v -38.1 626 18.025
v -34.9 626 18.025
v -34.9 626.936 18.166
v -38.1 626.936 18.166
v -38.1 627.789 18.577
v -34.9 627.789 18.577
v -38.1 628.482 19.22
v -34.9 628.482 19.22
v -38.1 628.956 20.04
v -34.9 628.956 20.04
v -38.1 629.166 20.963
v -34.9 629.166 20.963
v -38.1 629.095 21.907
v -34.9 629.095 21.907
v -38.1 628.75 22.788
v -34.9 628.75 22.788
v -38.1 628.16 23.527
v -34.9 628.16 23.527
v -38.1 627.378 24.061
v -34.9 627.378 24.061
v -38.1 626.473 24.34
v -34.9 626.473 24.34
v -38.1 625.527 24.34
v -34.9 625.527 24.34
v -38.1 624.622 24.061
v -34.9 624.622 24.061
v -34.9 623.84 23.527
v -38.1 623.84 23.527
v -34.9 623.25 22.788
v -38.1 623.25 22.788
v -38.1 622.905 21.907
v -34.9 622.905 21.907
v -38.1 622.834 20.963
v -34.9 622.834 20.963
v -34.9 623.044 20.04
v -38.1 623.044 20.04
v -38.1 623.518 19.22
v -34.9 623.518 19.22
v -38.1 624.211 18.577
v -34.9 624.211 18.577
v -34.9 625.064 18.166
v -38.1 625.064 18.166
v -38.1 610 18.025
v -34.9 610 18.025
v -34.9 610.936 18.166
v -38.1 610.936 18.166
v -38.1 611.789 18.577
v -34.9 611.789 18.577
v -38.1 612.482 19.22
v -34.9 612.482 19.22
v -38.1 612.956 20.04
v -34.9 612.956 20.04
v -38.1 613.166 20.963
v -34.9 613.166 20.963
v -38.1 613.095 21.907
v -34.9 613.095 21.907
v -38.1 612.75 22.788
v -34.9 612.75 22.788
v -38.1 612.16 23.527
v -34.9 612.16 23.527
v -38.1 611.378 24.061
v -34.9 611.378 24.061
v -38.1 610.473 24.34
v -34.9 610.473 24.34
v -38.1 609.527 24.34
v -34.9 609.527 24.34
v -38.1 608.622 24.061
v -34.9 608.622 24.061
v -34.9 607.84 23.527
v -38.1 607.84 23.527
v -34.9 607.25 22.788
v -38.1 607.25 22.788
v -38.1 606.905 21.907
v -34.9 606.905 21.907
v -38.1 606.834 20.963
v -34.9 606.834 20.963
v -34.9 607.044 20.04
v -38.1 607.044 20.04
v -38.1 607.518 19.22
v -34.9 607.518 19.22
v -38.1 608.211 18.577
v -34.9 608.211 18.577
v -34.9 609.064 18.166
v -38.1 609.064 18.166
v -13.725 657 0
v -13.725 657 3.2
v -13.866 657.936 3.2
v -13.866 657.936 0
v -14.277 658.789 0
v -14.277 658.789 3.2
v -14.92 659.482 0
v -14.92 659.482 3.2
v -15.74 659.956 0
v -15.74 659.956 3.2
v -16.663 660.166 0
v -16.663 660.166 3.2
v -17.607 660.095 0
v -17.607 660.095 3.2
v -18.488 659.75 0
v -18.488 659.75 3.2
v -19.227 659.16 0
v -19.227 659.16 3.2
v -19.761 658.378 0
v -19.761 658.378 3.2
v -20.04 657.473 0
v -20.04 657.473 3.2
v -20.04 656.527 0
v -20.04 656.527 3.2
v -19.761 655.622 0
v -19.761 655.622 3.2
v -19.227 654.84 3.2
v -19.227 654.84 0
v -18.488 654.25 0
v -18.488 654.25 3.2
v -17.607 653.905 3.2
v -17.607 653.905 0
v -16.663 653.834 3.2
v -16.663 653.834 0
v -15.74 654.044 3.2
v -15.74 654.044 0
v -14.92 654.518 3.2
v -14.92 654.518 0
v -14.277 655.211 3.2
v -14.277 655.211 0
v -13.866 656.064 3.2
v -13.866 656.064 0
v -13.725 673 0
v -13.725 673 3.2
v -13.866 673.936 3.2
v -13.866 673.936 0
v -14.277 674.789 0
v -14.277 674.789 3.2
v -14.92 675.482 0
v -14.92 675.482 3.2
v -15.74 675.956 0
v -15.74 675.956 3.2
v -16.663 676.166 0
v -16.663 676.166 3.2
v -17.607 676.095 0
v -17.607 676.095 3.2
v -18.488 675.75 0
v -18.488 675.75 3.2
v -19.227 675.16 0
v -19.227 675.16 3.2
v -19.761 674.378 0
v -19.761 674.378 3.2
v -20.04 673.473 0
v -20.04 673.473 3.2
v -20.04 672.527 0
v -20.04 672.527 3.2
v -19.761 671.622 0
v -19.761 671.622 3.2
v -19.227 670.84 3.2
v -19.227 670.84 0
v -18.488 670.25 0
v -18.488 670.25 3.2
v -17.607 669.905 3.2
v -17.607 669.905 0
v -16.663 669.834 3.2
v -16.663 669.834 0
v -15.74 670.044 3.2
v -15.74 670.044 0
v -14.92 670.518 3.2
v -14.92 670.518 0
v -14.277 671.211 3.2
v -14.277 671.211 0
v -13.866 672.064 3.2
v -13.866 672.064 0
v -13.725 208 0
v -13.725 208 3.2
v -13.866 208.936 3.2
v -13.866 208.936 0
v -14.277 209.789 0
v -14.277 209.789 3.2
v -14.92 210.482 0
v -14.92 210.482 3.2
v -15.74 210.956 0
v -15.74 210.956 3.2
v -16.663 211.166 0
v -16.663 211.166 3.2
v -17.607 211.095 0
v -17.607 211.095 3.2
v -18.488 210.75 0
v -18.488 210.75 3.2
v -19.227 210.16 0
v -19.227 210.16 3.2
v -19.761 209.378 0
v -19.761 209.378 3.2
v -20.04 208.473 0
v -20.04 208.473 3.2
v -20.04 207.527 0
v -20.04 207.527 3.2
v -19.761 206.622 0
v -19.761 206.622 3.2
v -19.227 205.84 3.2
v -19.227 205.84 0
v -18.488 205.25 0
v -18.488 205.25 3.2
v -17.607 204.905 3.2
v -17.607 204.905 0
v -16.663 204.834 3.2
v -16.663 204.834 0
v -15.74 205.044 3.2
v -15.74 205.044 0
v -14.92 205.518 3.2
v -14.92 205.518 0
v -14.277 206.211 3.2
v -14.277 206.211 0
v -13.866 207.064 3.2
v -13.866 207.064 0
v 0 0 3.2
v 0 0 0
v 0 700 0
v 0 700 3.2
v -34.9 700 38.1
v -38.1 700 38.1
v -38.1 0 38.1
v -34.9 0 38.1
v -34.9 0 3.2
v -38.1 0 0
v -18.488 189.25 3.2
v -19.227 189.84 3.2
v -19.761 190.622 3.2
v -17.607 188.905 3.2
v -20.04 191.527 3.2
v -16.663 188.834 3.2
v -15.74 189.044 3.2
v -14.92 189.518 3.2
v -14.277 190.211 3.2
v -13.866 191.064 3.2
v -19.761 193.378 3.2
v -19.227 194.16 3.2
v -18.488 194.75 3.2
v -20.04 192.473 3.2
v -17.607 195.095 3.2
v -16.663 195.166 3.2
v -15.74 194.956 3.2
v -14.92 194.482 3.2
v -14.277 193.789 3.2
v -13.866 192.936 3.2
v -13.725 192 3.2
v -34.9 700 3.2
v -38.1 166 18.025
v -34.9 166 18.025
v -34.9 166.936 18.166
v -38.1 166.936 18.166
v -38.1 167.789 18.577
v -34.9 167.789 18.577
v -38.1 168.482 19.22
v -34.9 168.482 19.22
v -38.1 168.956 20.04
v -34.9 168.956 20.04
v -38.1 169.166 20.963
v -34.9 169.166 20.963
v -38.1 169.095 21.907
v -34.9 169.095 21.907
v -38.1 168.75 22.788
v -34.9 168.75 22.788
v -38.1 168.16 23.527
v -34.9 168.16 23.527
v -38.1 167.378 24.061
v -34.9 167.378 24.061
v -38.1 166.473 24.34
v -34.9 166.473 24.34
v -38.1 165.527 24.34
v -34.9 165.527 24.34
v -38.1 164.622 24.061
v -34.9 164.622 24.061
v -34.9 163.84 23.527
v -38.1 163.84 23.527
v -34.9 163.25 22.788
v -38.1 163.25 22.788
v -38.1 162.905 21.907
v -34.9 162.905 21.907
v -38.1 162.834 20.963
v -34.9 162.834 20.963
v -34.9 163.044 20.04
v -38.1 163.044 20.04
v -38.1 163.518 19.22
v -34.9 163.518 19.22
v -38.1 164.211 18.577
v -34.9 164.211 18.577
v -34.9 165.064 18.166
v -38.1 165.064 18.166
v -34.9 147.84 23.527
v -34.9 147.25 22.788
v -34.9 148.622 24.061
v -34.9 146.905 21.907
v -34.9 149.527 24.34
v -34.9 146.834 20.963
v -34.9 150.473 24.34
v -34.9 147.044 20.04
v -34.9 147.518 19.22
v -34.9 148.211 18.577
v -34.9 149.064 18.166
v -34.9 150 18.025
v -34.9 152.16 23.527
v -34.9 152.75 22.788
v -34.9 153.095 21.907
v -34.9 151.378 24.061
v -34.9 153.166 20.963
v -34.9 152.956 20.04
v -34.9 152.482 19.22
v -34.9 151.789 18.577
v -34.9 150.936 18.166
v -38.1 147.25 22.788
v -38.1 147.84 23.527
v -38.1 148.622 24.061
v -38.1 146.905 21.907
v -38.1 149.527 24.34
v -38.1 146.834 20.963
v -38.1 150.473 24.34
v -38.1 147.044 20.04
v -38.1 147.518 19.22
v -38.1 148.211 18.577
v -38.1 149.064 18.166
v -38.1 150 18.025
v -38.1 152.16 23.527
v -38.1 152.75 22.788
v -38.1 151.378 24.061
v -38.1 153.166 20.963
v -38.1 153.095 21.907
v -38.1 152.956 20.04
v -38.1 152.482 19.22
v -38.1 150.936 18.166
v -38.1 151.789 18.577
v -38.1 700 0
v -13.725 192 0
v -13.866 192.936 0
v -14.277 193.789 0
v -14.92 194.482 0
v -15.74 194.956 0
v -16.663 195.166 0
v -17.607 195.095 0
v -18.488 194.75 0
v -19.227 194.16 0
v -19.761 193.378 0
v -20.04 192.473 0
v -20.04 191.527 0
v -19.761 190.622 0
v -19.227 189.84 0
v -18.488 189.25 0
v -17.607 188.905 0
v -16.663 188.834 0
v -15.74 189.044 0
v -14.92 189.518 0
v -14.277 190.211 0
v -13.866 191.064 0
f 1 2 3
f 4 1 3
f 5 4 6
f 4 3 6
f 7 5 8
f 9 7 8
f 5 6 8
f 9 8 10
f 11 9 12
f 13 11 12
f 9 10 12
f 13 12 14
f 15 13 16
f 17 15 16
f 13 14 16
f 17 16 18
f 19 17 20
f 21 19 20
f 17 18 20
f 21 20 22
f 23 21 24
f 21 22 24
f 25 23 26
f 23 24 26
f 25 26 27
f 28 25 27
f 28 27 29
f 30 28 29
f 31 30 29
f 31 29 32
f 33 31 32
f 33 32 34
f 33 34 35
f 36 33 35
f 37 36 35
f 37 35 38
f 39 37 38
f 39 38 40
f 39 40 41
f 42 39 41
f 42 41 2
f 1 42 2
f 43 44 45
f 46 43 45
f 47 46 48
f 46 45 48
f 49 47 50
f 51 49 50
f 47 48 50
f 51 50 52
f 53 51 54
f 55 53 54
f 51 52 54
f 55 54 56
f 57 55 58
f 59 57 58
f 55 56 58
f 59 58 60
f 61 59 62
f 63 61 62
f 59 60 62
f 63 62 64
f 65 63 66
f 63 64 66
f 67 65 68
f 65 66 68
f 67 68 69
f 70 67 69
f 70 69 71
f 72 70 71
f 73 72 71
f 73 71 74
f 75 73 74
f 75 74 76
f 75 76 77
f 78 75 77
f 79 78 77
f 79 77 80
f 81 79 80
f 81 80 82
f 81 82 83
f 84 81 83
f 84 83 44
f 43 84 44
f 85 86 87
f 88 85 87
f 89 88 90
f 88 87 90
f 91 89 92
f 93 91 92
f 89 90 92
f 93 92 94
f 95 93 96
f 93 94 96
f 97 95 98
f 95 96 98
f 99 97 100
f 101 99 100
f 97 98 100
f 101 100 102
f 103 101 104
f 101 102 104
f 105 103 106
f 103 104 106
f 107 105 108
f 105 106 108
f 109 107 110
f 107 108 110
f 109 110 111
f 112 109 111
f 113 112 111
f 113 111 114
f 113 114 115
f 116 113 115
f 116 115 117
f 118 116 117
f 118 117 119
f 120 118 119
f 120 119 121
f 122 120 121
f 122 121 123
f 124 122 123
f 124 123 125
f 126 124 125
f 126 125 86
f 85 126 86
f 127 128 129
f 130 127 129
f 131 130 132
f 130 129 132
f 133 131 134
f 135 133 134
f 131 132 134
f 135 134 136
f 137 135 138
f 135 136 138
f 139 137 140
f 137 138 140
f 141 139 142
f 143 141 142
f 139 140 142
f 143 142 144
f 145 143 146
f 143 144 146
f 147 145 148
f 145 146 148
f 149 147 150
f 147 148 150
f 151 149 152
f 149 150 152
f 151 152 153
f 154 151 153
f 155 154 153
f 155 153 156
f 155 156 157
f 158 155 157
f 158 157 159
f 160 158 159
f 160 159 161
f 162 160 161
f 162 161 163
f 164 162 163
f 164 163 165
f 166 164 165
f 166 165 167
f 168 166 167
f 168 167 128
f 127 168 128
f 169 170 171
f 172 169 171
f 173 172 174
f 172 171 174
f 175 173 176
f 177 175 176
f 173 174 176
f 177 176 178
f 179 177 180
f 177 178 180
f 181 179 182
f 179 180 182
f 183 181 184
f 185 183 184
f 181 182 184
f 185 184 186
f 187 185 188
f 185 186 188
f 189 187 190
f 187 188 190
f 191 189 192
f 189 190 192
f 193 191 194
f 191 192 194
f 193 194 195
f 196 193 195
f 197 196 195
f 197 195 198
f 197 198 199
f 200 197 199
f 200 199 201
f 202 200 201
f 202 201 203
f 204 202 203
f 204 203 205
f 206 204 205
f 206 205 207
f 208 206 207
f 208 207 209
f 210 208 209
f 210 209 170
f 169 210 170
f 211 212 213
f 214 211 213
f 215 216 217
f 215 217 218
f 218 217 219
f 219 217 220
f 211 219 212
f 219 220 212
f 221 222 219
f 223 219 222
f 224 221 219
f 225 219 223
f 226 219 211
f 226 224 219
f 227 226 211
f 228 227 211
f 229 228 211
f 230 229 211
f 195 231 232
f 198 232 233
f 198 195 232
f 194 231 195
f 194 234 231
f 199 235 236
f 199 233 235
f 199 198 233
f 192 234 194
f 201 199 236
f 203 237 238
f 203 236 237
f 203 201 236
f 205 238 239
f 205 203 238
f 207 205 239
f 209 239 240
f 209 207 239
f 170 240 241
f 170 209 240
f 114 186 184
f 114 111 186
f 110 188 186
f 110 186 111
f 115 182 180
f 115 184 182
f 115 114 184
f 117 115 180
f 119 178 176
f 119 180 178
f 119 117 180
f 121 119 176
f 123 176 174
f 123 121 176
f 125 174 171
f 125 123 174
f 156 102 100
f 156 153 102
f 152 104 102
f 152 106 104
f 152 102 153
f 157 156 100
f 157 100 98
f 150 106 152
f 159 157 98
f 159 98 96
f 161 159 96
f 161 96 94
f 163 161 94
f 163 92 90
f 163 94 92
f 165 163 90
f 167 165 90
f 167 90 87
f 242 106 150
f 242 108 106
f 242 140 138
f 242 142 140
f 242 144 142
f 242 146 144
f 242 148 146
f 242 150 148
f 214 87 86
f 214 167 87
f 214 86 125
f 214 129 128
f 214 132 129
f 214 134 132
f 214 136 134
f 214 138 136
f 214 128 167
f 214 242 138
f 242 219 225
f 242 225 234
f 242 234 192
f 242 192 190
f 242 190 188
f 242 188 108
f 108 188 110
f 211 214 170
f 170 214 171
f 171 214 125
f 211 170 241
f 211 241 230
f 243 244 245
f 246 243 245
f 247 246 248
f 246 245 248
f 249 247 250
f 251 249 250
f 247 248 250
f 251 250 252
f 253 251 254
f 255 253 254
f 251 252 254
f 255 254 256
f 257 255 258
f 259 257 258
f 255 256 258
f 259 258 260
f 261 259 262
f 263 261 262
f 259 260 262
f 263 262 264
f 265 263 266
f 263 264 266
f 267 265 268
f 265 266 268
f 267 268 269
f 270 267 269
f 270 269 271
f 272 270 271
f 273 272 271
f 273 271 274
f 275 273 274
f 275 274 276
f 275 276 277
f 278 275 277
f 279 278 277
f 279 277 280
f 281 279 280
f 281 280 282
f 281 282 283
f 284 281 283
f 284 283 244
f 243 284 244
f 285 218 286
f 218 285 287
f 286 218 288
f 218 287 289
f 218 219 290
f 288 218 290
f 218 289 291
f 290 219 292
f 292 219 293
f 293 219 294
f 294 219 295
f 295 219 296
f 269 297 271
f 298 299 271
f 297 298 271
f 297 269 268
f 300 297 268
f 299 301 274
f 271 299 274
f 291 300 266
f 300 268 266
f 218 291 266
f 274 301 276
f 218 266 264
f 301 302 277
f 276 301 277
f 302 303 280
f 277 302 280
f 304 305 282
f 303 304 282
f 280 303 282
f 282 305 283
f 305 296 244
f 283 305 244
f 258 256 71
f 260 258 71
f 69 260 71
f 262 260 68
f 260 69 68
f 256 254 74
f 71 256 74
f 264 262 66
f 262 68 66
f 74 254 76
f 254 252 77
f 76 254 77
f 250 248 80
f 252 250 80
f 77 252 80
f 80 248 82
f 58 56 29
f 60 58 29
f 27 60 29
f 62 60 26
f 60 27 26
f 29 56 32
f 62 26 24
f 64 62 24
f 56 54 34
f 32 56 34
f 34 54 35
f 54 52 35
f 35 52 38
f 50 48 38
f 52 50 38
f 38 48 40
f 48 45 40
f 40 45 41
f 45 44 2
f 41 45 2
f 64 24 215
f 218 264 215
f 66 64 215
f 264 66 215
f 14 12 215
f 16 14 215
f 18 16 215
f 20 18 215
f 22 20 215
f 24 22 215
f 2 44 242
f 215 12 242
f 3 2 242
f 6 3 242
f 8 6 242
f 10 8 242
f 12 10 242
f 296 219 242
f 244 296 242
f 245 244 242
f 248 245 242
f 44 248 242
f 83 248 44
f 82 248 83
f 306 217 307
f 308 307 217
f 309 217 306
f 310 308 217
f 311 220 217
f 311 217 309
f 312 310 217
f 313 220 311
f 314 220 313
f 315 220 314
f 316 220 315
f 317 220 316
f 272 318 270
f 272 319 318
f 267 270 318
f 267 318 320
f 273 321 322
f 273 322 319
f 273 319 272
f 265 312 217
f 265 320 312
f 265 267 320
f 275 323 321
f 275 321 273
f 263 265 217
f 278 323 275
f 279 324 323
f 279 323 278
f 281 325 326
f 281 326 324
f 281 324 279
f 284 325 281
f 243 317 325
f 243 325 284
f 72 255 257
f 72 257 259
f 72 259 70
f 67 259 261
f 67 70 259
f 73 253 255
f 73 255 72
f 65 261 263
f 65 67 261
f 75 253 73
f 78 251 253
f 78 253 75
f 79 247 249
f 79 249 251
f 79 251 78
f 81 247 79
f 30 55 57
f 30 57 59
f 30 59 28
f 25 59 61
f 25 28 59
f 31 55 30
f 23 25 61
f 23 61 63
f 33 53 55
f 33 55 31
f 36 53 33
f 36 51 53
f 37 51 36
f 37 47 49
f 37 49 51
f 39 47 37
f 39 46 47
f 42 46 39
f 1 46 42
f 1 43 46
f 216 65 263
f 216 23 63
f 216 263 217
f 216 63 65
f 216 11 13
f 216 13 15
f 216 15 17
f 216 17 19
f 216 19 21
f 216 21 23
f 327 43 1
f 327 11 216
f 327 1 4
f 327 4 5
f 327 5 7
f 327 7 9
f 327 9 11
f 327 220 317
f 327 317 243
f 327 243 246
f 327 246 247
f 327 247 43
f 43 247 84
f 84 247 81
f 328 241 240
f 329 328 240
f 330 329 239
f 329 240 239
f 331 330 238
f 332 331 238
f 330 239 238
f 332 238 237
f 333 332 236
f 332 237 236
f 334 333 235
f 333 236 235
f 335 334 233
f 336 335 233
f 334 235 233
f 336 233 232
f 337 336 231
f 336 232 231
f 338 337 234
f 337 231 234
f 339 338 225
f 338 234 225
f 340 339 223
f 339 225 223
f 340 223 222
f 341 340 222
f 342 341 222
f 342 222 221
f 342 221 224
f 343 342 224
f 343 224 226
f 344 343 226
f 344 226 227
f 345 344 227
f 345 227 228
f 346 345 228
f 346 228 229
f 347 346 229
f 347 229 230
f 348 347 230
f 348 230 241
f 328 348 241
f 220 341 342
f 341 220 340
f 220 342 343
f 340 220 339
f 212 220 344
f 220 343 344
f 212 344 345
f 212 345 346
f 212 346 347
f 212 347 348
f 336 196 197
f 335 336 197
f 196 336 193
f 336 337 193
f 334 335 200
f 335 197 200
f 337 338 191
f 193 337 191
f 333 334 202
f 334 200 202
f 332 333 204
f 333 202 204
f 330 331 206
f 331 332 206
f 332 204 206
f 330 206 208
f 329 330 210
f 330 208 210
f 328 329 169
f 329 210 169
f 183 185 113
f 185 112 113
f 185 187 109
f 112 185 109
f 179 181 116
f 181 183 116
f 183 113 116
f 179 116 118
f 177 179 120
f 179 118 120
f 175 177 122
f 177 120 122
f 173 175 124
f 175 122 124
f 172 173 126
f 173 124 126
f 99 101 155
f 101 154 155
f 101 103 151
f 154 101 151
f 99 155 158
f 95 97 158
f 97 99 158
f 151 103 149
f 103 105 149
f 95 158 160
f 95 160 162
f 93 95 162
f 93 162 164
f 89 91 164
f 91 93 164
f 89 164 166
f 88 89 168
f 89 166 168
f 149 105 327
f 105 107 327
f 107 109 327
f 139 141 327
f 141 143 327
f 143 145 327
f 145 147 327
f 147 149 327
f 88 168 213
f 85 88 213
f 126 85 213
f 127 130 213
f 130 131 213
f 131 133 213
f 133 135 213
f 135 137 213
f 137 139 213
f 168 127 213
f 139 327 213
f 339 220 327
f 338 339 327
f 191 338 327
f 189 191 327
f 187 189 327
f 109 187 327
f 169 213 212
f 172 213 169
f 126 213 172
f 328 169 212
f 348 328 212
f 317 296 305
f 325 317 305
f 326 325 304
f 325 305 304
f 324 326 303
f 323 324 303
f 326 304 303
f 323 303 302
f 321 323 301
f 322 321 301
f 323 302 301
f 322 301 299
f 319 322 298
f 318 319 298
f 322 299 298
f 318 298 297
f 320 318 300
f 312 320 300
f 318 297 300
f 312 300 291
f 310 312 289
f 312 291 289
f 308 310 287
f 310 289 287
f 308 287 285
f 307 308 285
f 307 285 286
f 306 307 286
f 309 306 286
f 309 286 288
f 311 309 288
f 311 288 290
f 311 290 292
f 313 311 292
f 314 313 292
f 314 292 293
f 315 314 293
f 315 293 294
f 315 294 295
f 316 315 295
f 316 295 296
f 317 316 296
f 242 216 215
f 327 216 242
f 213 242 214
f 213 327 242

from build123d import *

# Parameters (mm, degrees)
CROQUIS1_W              = 38.1
CROQUIS1_H              = 700
SALIENTE_EXTRUIR1_DEPTH = 3.2
CROQUIS2_W              = 3.2
CROQUIS2_H              = 700
SALIENTE_EXTRUIR2_DEPTH = 34.9
CROQUIS5_R              = 3.175
CORTAR_EXTRUIR1_DEPTH   = 10
CROQUIS6_R              = 3.175
CORTAR_EXTRUIR2_DEPTH   = 10


with BuildPart() as part:
    # Croquis1 → Saliente-Extruir1 (new body)
    with BuildSketch(Plane.XY):
        with Locations((-19.05, 350)):
            Rectangle(CROQUIS1_W, CROQUIS1_H)
    extrude(amount=SALIENTE_EXTRUIR1_DEPTH)

    # Croquis2 → Saliente-Extruir2 (add)
    with BuildSketch(Plane.XY.offset(3.2)):
        with Locations((-36.5, 350)):
            Rectangle(CROQUIS2_W, CROQUIS2_H)
    extrude(amount=SALIENTE_EXTRUIR2_DEPTH)

    # Croquis5 → Cortar-Extruir1 (cut)
    with BuildSketch(Plane.XY.offset(3.2)):
        with Locations((-16.9, 673)):
            Circle(CROQUIS5_R)
        with Locations((-16.9, 657)):
            Circle(CROQUIS5_R)
        with Locations((-16.9, 208)):
            Circle(CROQUIS5_R)
        with Locations((-16.9, 192)):
            Circle(CROQUIS5_R)
    extrude(amount=-CORTAR_EXTRUIR1_DEPTH, mode=Mode.SUBTRACT)

    # Croquis6 → Cortar-Extruir2 (cut)
    with BuildSketch(Plane(origin=(-34.9, 0, 0), x_dir=(0, 0, -1), z_dir=(1, 0, 0))):
        with Locations((-21.2, 626)):
            Circle(CROQUIS6_R)
        with Locations((-21.2, 610)):
            Circle(CROQUIS6_R)
        with Locations((-21.2, 166)):
            Circle(CROQUIS6_R)
        with Locations((-21.2, 150)):
            Circle(CROQUIS6_R)
    extrude(amount=-CORTAR_EXTRUIR2_DEPTH, mode=Mode.SUBTRACT)


solid = part.part
